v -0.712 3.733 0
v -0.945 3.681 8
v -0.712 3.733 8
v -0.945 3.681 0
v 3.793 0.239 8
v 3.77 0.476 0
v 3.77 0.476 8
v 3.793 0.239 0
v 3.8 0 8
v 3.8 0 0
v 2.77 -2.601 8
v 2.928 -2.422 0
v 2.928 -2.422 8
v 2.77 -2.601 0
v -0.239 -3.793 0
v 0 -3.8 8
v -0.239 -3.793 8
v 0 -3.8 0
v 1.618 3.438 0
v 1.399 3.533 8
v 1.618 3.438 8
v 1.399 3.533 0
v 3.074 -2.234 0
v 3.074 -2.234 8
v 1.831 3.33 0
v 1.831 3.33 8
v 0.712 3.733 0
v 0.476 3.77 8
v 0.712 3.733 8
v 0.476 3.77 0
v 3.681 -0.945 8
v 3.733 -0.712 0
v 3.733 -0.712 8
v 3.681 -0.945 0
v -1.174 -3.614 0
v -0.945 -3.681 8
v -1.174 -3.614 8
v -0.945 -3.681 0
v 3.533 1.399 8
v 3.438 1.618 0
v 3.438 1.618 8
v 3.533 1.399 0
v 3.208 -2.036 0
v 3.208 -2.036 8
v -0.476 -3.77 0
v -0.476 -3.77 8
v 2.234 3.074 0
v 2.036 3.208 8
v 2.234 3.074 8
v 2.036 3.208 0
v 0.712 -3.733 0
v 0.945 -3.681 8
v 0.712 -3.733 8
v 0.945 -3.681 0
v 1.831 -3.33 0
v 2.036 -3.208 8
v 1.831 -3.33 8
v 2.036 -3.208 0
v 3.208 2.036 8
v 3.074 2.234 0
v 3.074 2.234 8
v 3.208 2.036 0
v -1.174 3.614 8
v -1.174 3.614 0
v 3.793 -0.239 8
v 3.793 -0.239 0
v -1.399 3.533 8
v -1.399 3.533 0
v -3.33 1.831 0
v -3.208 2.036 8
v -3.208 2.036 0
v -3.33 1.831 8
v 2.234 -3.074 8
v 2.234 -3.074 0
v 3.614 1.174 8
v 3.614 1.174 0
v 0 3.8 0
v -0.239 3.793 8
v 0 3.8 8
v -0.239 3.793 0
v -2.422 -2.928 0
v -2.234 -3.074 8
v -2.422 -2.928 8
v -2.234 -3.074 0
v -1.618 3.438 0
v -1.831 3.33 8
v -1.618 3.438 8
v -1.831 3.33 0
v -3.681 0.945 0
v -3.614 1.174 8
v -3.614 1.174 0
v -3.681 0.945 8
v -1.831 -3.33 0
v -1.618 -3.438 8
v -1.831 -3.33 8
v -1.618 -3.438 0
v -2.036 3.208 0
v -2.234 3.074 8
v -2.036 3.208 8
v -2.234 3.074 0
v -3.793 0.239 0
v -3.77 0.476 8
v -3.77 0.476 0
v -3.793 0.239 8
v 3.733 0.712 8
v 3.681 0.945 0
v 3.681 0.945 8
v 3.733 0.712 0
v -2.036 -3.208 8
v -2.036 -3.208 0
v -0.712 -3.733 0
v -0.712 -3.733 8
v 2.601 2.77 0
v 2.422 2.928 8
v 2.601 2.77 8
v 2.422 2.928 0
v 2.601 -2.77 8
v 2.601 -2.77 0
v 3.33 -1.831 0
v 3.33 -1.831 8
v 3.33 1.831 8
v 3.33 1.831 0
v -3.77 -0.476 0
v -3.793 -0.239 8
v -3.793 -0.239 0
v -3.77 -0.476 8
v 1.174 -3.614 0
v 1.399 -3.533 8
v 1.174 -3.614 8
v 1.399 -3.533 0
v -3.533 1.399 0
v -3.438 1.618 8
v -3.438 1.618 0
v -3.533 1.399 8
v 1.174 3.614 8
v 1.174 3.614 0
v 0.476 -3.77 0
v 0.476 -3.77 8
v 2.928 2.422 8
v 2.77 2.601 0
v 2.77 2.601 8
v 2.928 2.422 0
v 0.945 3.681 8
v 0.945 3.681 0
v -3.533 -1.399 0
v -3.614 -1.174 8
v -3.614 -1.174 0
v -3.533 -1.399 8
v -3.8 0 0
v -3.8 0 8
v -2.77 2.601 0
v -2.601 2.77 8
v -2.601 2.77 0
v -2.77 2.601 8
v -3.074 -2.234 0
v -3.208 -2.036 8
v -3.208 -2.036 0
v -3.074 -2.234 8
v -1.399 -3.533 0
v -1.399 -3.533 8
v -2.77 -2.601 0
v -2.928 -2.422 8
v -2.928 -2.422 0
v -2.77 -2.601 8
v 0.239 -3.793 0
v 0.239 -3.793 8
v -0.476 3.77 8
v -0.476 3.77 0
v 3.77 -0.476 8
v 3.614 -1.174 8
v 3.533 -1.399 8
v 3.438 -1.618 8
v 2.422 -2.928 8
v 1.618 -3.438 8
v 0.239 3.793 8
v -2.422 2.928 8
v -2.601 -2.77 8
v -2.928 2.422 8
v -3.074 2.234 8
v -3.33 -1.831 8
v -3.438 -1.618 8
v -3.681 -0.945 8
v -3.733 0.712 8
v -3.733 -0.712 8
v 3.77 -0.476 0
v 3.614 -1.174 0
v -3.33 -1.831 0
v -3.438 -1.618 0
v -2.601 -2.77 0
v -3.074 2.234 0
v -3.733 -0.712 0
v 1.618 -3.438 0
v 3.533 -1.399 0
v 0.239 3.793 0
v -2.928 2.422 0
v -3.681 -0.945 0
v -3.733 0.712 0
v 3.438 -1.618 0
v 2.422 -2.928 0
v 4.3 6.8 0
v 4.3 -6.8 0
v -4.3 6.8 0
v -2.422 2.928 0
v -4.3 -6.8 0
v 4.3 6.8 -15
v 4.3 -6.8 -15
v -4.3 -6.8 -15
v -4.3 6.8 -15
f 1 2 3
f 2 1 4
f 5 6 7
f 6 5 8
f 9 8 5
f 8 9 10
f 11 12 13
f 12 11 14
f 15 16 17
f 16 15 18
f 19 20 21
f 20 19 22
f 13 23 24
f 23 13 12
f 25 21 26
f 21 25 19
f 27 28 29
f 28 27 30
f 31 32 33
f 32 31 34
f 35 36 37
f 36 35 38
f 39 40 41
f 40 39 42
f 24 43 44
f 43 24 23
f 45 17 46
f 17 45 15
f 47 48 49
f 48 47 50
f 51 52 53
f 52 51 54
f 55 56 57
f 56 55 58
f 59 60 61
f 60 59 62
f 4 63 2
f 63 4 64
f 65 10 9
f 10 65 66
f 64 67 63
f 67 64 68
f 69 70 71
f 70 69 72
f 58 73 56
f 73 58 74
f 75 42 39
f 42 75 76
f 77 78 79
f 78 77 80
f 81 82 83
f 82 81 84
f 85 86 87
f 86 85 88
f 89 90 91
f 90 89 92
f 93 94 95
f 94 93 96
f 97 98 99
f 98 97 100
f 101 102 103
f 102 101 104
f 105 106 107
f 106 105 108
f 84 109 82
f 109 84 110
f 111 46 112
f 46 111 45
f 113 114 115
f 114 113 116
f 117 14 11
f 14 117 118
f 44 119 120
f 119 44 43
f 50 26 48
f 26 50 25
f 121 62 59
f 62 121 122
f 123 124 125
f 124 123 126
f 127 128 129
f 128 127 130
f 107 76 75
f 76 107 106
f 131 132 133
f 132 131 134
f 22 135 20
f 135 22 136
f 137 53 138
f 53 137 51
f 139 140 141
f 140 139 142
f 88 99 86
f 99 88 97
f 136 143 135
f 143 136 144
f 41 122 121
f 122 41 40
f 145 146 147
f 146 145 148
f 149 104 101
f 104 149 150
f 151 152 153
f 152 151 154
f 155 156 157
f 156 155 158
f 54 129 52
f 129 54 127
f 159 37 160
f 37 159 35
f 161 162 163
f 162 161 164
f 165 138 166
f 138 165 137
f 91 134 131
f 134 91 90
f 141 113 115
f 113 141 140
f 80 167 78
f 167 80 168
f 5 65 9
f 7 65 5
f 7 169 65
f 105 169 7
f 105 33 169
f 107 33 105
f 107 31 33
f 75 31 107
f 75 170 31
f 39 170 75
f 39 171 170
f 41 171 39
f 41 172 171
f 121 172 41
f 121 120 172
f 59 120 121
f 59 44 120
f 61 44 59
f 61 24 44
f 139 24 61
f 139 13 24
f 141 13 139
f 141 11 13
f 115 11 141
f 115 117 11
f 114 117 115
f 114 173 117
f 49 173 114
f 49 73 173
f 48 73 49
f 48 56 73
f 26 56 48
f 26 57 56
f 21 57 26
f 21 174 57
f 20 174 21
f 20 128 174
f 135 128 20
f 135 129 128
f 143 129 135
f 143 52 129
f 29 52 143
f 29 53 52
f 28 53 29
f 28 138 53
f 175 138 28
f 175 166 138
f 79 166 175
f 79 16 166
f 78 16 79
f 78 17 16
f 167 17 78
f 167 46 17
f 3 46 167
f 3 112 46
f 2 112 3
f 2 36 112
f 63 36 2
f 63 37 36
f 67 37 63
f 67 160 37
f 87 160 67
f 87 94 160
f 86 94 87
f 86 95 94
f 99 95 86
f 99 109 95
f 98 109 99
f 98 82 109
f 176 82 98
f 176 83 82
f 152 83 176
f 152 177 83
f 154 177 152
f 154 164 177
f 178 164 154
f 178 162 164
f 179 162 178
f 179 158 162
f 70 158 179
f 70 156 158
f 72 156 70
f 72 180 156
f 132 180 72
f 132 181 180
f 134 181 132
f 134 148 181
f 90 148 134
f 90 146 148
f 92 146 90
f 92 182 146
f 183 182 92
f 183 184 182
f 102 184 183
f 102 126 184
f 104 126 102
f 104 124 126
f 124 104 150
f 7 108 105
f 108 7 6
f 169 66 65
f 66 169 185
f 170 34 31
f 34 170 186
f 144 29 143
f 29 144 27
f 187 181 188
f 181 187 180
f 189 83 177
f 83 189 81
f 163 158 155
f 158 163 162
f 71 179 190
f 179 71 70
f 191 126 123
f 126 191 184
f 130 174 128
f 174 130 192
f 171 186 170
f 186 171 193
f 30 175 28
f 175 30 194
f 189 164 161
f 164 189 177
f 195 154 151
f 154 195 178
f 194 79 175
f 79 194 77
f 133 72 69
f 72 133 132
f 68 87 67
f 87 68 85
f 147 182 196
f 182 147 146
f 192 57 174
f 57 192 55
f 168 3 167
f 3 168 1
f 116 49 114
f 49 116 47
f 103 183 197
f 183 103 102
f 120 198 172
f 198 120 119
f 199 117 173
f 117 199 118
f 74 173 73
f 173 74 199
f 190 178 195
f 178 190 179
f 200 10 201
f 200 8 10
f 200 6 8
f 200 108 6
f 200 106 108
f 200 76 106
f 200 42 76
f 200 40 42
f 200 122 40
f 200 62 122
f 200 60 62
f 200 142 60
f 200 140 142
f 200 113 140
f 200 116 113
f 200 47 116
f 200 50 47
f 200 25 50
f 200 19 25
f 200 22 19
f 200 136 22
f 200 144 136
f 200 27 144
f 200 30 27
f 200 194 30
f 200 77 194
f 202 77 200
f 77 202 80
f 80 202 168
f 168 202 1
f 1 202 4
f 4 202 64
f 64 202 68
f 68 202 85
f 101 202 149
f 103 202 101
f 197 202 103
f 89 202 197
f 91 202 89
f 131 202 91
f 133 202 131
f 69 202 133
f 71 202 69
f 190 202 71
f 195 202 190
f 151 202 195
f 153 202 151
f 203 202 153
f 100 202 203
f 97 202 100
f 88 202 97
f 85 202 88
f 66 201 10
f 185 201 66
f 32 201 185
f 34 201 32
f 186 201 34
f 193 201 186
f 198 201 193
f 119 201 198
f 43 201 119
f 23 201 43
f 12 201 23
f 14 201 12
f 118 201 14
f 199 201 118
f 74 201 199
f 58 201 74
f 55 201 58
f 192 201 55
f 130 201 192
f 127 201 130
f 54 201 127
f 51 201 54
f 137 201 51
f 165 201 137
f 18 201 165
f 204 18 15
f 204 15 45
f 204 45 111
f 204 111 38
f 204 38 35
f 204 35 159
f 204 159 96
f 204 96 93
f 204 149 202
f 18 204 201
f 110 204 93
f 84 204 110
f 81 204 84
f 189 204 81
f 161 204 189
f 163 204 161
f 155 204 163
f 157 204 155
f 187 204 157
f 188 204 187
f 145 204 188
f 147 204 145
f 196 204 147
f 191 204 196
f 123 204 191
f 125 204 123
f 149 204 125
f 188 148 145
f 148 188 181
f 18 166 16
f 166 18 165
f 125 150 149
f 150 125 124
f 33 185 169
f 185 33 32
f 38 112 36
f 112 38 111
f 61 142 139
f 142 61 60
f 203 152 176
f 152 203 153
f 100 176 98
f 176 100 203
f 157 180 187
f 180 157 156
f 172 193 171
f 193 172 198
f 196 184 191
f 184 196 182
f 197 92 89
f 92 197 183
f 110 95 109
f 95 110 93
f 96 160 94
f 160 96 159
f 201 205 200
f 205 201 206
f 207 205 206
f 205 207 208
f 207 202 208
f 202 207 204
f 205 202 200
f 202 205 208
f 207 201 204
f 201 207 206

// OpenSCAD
$fn=100; 

tolerance = 0.3;
module toggle_switch(){
    
    
    shaft_height = 8;
    translate([0, 0, shaft_height/2]){
        cylinder(r=3.5 + tolerance, h=shaft_height, center=true);
    }
    
    body_height = 15;
    translate([0, 0, -body_height/2]){
        cube([8+tolerance*2, 13+tolerance*2, body_height], center = true);
    }      
    

}

toggle_switch();
